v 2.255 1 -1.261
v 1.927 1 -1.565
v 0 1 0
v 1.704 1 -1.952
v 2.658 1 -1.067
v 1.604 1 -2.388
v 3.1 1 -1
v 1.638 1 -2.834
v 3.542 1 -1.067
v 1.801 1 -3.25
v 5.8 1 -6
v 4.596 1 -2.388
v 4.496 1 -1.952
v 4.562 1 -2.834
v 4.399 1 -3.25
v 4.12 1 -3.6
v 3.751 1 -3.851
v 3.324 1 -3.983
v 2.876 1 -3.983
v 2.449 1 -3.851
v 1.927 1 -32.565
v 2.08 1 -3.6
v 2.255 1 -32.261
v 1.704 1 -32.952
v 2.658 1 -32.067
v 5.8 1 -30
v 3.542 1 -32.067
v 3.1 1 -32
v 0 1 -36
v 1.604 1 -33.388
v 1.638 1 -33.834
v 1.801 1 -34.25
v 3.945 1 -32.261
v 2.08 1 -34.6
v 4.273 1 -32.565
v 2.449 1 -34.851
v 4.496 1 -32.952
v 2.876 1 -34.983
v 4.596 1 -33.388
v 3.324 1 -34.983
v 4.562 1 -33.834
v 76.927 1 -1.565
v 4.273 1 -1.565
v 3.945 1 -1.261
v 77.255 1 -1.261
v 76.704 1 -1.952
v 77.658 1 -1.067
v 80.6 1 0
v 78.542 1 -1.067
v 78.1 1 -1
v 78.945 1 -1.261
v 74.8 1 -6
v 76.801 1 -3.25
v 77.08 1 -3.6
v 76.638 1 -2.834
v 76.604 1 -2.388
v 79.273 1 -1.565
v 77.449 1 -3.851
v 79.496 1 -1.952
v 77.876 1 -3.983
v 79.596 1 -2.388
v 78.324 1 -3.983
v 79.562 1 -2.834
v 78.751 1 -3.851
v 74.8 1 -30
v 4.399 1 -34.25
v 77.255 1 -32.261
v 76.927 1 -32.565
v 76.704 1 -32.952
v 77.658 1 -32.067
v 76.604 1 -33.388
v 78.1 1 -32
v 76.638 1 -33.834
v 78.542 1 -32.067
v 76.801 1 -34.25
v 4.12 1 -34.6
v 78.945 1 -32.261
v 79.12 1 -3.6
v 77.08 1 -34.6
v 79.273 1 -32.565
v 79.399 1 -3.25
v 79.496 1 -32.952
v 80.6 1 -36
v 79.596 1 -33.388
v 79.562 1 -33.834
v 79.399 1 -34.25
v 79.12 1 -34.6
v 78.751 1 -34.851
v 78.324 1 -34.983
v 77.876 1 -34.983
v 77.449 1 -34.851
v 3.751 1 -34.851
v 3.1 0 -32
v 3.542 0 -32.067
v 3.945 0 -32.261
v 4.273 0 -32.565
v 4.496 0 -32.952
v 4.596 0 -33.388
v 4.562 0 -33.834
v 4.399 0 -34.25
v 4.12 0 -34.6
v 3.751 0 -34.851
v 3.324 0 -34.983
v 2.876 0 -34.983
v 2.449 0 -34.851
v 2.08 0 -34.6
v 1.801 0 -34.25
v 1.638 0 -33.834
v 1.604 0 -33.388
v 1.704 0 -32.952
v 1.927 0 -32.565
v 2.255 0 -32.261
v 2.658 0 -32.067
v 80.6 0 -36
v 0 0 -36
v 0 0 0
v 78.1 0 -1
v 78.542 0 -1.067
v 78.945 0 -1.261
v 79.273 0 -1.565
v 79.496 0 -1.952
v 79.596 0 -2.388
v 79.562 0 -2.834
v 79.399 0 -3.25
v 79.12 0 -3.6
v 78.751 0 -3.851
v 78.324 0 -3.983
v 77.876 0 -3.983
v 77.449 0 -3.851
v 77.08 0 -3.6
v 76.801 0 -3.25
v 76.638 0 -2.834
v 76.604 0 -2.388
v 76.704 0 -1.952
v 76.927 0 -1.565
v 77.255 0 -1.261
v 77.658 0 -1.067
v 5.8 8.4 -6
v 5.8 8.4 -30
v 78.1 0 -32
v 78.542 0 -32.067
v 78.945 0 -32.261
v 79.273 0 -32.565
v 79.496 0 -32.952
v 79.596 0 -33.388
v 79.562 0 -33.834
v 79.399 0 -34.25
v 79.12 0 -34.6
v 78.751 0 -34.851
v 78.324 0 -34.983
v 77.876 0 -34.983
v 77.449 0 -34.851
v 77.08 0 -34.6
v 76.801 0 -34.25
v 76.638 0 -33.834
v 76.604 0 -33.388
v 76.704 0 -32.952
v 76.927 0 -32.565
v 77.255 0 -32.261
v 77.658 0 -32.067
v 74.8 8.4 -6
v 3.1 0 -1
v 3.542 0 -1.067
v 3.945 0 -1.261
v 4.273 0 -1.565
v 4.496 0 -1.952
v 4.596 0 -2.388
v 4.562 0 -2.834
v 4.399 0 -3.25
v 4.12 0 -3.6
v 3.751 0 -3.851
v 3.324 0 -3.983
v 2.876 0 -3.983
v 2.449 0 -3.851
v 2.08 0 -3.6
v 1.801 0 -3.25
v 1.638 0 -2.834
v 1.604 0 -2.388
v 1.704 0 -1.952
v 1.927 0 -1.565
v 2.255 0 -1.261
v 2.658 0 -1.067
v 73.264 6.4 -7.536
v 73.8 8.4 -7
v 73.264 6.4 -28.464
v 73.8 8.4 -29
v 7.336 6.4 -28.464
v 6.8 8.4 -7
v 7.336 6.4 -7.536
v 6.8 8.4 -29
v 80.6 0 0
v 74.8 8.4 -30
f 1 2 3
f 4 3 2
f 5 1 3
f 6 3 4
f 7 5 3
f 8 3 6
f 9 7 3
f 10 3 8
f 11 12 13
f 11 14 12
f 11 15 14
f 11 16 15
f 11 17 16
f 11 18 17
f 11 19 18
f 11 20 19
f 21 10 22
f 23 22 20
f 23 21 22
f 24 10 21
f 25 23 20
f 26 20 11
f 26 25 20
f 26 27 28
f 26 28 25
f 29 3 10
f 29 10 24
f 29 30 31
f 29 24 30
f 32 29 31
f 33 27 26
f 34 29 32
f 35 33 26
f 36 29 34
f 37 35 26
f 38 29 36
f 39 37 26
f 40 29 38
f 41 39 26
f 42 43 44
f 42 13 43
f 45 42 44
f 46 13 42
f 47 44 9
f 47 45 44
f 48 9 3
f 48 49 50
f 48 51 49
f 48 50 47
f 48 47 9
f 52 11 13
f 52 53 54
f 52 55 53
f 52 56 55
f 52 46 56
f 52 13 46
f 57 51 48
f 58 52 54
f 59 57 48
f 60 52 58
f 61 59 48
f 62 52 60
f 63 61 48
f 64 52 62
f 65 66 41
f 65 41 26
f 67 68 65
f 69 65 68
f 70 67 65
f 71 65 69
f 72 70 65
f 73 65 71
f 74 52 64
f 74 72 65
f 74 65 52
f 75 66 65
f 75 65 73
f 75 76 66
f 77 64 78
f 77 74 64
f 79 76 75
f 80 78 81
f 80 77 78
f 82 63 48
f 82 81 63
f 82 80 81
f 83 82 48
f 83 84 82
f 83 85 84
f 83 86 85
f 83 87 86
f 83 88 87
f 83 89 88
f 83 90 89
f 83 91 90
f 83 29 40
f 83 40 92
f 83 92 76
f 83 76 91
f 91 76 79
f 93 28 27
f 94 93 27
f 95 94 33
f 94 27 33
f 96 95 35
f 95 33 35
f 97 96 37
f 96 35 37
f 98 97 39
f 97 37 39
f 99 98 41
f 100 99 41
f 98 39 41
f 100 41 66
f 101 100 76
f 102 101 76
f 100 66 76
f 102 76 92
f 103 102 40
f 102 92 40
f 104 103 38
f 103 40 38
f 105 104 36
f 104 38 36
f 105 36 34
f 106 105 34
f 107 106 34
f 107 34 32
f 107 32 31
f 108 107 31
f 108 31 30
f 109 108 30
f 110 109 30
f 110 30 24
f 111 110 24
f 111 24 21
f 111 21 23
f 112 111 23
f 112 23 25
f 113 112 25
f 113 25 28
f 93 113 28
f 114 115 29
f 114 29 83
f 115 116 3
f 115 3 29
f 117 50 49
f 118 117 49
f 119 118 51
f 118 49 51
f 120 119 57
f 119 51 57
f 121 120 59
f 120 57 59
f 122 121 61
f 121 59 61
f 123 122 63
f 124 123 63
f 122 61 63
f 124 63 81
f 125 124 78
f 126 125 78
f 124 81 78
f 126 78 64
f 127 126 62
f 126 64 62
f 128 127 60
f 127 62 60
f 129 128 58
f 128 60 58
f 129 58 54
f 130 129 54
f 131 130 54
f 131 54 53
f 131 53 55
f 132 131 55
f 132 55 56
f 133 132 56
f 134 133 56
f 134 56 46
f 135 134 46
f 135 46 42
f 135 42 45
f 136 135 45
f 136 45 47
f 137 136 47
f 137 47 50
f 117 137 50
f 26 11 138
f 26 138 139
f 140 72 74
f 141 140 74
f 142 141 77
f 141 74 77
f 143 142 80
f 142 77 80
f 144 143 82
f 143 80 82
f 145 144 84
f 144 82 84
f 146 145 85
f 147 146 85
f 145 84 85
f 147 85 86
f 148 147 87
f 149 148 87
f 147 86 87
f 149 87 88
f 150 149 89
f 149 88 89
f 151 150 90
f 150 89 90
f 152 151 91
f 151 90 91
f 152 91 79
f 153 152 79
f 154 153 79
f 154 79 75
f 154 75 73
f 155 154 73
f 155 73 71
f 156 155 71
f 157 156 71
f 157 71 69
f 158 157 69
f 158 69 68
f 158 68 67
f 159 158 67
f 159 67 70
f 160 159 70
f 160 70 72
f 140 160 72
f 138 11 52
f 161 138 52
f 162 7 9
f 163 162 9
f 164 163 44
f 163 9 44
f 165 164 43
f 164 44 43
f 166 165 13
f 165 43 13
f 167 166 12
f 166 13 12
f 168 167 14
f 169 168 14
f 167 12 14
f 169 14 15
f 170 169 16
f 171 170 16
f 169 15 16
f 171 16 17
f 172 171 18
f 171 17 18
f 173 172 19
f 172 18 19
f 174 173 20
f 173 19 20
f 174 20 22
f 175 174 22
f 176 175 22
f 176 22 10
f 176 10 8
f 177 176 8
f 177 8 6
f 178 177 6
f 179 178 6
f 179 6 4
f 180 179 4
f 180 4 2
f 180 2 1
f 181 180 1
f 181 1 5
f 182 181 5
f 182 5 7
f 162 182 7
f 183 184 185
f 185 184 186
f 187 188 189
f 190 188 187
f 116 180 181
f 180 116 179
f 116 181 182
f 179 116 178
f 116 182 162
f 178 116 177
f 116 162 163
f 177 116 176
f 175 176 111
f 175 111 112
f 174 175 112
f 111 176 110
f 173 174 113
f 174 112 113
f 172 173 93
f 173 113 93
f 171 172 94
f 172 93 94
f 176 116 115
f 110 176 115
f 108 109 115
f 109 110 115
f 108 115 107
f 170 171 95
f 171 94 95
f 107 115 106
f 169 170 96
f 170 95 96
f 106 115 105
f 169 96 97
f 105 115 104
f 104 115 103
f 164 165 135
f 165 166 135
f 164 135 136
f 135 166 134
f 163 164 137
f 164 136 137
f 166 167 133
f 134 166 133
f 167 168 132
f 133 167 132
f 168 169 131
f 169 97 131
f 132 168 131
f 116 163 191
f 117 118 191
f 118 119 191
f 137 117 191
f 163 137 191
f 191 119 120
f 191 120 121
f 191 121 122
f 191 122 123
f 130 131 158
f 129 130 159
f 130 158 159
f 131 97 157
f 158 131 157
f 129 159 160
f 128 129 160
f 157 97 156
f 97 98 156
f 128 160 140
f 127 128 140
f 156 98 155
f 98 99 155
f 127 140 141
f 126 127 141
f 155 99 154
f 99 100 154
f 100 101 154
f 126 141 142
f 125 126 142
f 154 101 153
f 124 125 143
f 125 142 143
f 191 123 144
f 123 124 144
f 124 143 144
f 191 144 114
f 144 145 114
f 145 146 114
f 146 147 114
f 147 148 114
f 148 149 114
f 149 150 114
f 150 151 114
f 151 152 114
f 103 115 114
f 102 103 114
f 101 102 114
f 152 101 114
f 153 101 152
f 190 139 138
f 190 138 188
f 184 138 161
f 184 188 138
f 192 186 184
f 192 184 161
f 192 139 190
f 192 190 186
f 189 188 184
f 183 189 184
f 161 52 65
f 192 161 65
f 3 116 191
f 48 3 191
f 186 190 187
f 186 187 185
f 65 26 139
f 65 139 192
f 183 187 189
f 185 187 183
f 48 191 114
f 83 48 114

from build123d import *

# Parameters (mm, degrees)
SKETCH1_W           = 80.6
SKETCH1_H           = 36
BOSS_EXTRUDE1_DEPTH = 1
SKETCH2_W           = 69
SKETCH2_H           = 24
BOSS_EXTRUDE2_DEPTH = 7.4
SKETCH3_R           = 1.5
CUT_EXTRUDE1_DEPTH  = 7.4
SKETCH4_W           = 67
SKETCH4_H           = 22
CUT_EXTRUDE2_DEPTH  = 2
CUT_EXTRUDE2_DRAFT  = -15


with BuildPart() as part:
    # Sketch1 → Boss-Extrude1 (new body)
    with BuildSketch(Plane(origin=(0, 0, 0), x_dir=(1, 0, 0), z_dir=(0, 1, 0))):
        with Locations((40.3, 18)):
            Rectangle(SKETCH1_W, SKETCH1_H)
    extrude(amount=BOSS_EXTRUDE1_DEPTH)

    # Sketch2 → Boss-Extrude2 (add)
    with BuildSketch(Plane(origin=(0, 1, 0), x_dir=(1, 0, 0), z_dir=(0, 1, 0))):
        with Locations((40.3, 18)):
            Rectangle(SKETCH2_W, SKETCH2_H)
    extrude(amount=BOSS_EXTRUDE2_DEPTH)

    # Sketch3 → Cut-Extrude1 (cut)
    with BuildSketch(Plane(origin=(0, 1, 0), x_dir=(1, 0, 0), z_dir=(0, 1, 0))):
        with Locations(Location((3.1, 33.5, 0), (0, 0, 270))):
            Circle(SKETCH3_R)
        with Locations(Location((3.1, 2.5, 0), (0, 0, 270))):
            Circle(SKETCH3_R)
        with Locations(Location((78.1, 2.5, 0), (0, 0, 270))):
            Circle(SKETCH3_R)
        with Locations(Location((78.1, 33.5, 0), (0, 0, 270))):
            Circle(SKETCH3_R)
    extrude(amount=-CUT_EXTRUDE1_DEPTH, mode=Mode.SUBTRACT)


with BuildPart() as cut_extrude2_tool:
    # Sketch4 → Cut-Extrude2 (with draft: the straight prism first)
    with BuildSketch(Plane(origin=(0, 8.4, 0), x_dir=(1, 0, 0), z_dir=(0, 1, 0))):
        with Locations((40.3, 18)):
            Rectangle(SKETCH4_W, SKETCH4_H)
    extrude(amount=-CUT_EXTRUDE2_DEPTH)
    # Cut-Extrude2: the draft: its side faces are tilted about the plane it starts from
    cut_extrude2_sides = [cut_extrude2_tool.faces().sort_by_distance(p)[0] for p in [
        (6.8, 7.4, -18),
        (40.3, 7.4, -7),
        (73.8, 7.4, -18),
        (40.3, 7.4, -29),
    ]]
    draft(cut_extrude2_sides, Plane(origin=(0, 8.4, 0), x_dir=(1, 0, 0), z_dir=(0, 1, 0)), CUT_EXTRUDE2_DRAFT)


with BuildPart() as part_1:
    add(part.part)

    # Cut-Extrude2: cut by cut_extrude2_tool
    add(cut_extrude2_tool.part, mode=Mode.SUBTRACT)


solid = part_1.part
